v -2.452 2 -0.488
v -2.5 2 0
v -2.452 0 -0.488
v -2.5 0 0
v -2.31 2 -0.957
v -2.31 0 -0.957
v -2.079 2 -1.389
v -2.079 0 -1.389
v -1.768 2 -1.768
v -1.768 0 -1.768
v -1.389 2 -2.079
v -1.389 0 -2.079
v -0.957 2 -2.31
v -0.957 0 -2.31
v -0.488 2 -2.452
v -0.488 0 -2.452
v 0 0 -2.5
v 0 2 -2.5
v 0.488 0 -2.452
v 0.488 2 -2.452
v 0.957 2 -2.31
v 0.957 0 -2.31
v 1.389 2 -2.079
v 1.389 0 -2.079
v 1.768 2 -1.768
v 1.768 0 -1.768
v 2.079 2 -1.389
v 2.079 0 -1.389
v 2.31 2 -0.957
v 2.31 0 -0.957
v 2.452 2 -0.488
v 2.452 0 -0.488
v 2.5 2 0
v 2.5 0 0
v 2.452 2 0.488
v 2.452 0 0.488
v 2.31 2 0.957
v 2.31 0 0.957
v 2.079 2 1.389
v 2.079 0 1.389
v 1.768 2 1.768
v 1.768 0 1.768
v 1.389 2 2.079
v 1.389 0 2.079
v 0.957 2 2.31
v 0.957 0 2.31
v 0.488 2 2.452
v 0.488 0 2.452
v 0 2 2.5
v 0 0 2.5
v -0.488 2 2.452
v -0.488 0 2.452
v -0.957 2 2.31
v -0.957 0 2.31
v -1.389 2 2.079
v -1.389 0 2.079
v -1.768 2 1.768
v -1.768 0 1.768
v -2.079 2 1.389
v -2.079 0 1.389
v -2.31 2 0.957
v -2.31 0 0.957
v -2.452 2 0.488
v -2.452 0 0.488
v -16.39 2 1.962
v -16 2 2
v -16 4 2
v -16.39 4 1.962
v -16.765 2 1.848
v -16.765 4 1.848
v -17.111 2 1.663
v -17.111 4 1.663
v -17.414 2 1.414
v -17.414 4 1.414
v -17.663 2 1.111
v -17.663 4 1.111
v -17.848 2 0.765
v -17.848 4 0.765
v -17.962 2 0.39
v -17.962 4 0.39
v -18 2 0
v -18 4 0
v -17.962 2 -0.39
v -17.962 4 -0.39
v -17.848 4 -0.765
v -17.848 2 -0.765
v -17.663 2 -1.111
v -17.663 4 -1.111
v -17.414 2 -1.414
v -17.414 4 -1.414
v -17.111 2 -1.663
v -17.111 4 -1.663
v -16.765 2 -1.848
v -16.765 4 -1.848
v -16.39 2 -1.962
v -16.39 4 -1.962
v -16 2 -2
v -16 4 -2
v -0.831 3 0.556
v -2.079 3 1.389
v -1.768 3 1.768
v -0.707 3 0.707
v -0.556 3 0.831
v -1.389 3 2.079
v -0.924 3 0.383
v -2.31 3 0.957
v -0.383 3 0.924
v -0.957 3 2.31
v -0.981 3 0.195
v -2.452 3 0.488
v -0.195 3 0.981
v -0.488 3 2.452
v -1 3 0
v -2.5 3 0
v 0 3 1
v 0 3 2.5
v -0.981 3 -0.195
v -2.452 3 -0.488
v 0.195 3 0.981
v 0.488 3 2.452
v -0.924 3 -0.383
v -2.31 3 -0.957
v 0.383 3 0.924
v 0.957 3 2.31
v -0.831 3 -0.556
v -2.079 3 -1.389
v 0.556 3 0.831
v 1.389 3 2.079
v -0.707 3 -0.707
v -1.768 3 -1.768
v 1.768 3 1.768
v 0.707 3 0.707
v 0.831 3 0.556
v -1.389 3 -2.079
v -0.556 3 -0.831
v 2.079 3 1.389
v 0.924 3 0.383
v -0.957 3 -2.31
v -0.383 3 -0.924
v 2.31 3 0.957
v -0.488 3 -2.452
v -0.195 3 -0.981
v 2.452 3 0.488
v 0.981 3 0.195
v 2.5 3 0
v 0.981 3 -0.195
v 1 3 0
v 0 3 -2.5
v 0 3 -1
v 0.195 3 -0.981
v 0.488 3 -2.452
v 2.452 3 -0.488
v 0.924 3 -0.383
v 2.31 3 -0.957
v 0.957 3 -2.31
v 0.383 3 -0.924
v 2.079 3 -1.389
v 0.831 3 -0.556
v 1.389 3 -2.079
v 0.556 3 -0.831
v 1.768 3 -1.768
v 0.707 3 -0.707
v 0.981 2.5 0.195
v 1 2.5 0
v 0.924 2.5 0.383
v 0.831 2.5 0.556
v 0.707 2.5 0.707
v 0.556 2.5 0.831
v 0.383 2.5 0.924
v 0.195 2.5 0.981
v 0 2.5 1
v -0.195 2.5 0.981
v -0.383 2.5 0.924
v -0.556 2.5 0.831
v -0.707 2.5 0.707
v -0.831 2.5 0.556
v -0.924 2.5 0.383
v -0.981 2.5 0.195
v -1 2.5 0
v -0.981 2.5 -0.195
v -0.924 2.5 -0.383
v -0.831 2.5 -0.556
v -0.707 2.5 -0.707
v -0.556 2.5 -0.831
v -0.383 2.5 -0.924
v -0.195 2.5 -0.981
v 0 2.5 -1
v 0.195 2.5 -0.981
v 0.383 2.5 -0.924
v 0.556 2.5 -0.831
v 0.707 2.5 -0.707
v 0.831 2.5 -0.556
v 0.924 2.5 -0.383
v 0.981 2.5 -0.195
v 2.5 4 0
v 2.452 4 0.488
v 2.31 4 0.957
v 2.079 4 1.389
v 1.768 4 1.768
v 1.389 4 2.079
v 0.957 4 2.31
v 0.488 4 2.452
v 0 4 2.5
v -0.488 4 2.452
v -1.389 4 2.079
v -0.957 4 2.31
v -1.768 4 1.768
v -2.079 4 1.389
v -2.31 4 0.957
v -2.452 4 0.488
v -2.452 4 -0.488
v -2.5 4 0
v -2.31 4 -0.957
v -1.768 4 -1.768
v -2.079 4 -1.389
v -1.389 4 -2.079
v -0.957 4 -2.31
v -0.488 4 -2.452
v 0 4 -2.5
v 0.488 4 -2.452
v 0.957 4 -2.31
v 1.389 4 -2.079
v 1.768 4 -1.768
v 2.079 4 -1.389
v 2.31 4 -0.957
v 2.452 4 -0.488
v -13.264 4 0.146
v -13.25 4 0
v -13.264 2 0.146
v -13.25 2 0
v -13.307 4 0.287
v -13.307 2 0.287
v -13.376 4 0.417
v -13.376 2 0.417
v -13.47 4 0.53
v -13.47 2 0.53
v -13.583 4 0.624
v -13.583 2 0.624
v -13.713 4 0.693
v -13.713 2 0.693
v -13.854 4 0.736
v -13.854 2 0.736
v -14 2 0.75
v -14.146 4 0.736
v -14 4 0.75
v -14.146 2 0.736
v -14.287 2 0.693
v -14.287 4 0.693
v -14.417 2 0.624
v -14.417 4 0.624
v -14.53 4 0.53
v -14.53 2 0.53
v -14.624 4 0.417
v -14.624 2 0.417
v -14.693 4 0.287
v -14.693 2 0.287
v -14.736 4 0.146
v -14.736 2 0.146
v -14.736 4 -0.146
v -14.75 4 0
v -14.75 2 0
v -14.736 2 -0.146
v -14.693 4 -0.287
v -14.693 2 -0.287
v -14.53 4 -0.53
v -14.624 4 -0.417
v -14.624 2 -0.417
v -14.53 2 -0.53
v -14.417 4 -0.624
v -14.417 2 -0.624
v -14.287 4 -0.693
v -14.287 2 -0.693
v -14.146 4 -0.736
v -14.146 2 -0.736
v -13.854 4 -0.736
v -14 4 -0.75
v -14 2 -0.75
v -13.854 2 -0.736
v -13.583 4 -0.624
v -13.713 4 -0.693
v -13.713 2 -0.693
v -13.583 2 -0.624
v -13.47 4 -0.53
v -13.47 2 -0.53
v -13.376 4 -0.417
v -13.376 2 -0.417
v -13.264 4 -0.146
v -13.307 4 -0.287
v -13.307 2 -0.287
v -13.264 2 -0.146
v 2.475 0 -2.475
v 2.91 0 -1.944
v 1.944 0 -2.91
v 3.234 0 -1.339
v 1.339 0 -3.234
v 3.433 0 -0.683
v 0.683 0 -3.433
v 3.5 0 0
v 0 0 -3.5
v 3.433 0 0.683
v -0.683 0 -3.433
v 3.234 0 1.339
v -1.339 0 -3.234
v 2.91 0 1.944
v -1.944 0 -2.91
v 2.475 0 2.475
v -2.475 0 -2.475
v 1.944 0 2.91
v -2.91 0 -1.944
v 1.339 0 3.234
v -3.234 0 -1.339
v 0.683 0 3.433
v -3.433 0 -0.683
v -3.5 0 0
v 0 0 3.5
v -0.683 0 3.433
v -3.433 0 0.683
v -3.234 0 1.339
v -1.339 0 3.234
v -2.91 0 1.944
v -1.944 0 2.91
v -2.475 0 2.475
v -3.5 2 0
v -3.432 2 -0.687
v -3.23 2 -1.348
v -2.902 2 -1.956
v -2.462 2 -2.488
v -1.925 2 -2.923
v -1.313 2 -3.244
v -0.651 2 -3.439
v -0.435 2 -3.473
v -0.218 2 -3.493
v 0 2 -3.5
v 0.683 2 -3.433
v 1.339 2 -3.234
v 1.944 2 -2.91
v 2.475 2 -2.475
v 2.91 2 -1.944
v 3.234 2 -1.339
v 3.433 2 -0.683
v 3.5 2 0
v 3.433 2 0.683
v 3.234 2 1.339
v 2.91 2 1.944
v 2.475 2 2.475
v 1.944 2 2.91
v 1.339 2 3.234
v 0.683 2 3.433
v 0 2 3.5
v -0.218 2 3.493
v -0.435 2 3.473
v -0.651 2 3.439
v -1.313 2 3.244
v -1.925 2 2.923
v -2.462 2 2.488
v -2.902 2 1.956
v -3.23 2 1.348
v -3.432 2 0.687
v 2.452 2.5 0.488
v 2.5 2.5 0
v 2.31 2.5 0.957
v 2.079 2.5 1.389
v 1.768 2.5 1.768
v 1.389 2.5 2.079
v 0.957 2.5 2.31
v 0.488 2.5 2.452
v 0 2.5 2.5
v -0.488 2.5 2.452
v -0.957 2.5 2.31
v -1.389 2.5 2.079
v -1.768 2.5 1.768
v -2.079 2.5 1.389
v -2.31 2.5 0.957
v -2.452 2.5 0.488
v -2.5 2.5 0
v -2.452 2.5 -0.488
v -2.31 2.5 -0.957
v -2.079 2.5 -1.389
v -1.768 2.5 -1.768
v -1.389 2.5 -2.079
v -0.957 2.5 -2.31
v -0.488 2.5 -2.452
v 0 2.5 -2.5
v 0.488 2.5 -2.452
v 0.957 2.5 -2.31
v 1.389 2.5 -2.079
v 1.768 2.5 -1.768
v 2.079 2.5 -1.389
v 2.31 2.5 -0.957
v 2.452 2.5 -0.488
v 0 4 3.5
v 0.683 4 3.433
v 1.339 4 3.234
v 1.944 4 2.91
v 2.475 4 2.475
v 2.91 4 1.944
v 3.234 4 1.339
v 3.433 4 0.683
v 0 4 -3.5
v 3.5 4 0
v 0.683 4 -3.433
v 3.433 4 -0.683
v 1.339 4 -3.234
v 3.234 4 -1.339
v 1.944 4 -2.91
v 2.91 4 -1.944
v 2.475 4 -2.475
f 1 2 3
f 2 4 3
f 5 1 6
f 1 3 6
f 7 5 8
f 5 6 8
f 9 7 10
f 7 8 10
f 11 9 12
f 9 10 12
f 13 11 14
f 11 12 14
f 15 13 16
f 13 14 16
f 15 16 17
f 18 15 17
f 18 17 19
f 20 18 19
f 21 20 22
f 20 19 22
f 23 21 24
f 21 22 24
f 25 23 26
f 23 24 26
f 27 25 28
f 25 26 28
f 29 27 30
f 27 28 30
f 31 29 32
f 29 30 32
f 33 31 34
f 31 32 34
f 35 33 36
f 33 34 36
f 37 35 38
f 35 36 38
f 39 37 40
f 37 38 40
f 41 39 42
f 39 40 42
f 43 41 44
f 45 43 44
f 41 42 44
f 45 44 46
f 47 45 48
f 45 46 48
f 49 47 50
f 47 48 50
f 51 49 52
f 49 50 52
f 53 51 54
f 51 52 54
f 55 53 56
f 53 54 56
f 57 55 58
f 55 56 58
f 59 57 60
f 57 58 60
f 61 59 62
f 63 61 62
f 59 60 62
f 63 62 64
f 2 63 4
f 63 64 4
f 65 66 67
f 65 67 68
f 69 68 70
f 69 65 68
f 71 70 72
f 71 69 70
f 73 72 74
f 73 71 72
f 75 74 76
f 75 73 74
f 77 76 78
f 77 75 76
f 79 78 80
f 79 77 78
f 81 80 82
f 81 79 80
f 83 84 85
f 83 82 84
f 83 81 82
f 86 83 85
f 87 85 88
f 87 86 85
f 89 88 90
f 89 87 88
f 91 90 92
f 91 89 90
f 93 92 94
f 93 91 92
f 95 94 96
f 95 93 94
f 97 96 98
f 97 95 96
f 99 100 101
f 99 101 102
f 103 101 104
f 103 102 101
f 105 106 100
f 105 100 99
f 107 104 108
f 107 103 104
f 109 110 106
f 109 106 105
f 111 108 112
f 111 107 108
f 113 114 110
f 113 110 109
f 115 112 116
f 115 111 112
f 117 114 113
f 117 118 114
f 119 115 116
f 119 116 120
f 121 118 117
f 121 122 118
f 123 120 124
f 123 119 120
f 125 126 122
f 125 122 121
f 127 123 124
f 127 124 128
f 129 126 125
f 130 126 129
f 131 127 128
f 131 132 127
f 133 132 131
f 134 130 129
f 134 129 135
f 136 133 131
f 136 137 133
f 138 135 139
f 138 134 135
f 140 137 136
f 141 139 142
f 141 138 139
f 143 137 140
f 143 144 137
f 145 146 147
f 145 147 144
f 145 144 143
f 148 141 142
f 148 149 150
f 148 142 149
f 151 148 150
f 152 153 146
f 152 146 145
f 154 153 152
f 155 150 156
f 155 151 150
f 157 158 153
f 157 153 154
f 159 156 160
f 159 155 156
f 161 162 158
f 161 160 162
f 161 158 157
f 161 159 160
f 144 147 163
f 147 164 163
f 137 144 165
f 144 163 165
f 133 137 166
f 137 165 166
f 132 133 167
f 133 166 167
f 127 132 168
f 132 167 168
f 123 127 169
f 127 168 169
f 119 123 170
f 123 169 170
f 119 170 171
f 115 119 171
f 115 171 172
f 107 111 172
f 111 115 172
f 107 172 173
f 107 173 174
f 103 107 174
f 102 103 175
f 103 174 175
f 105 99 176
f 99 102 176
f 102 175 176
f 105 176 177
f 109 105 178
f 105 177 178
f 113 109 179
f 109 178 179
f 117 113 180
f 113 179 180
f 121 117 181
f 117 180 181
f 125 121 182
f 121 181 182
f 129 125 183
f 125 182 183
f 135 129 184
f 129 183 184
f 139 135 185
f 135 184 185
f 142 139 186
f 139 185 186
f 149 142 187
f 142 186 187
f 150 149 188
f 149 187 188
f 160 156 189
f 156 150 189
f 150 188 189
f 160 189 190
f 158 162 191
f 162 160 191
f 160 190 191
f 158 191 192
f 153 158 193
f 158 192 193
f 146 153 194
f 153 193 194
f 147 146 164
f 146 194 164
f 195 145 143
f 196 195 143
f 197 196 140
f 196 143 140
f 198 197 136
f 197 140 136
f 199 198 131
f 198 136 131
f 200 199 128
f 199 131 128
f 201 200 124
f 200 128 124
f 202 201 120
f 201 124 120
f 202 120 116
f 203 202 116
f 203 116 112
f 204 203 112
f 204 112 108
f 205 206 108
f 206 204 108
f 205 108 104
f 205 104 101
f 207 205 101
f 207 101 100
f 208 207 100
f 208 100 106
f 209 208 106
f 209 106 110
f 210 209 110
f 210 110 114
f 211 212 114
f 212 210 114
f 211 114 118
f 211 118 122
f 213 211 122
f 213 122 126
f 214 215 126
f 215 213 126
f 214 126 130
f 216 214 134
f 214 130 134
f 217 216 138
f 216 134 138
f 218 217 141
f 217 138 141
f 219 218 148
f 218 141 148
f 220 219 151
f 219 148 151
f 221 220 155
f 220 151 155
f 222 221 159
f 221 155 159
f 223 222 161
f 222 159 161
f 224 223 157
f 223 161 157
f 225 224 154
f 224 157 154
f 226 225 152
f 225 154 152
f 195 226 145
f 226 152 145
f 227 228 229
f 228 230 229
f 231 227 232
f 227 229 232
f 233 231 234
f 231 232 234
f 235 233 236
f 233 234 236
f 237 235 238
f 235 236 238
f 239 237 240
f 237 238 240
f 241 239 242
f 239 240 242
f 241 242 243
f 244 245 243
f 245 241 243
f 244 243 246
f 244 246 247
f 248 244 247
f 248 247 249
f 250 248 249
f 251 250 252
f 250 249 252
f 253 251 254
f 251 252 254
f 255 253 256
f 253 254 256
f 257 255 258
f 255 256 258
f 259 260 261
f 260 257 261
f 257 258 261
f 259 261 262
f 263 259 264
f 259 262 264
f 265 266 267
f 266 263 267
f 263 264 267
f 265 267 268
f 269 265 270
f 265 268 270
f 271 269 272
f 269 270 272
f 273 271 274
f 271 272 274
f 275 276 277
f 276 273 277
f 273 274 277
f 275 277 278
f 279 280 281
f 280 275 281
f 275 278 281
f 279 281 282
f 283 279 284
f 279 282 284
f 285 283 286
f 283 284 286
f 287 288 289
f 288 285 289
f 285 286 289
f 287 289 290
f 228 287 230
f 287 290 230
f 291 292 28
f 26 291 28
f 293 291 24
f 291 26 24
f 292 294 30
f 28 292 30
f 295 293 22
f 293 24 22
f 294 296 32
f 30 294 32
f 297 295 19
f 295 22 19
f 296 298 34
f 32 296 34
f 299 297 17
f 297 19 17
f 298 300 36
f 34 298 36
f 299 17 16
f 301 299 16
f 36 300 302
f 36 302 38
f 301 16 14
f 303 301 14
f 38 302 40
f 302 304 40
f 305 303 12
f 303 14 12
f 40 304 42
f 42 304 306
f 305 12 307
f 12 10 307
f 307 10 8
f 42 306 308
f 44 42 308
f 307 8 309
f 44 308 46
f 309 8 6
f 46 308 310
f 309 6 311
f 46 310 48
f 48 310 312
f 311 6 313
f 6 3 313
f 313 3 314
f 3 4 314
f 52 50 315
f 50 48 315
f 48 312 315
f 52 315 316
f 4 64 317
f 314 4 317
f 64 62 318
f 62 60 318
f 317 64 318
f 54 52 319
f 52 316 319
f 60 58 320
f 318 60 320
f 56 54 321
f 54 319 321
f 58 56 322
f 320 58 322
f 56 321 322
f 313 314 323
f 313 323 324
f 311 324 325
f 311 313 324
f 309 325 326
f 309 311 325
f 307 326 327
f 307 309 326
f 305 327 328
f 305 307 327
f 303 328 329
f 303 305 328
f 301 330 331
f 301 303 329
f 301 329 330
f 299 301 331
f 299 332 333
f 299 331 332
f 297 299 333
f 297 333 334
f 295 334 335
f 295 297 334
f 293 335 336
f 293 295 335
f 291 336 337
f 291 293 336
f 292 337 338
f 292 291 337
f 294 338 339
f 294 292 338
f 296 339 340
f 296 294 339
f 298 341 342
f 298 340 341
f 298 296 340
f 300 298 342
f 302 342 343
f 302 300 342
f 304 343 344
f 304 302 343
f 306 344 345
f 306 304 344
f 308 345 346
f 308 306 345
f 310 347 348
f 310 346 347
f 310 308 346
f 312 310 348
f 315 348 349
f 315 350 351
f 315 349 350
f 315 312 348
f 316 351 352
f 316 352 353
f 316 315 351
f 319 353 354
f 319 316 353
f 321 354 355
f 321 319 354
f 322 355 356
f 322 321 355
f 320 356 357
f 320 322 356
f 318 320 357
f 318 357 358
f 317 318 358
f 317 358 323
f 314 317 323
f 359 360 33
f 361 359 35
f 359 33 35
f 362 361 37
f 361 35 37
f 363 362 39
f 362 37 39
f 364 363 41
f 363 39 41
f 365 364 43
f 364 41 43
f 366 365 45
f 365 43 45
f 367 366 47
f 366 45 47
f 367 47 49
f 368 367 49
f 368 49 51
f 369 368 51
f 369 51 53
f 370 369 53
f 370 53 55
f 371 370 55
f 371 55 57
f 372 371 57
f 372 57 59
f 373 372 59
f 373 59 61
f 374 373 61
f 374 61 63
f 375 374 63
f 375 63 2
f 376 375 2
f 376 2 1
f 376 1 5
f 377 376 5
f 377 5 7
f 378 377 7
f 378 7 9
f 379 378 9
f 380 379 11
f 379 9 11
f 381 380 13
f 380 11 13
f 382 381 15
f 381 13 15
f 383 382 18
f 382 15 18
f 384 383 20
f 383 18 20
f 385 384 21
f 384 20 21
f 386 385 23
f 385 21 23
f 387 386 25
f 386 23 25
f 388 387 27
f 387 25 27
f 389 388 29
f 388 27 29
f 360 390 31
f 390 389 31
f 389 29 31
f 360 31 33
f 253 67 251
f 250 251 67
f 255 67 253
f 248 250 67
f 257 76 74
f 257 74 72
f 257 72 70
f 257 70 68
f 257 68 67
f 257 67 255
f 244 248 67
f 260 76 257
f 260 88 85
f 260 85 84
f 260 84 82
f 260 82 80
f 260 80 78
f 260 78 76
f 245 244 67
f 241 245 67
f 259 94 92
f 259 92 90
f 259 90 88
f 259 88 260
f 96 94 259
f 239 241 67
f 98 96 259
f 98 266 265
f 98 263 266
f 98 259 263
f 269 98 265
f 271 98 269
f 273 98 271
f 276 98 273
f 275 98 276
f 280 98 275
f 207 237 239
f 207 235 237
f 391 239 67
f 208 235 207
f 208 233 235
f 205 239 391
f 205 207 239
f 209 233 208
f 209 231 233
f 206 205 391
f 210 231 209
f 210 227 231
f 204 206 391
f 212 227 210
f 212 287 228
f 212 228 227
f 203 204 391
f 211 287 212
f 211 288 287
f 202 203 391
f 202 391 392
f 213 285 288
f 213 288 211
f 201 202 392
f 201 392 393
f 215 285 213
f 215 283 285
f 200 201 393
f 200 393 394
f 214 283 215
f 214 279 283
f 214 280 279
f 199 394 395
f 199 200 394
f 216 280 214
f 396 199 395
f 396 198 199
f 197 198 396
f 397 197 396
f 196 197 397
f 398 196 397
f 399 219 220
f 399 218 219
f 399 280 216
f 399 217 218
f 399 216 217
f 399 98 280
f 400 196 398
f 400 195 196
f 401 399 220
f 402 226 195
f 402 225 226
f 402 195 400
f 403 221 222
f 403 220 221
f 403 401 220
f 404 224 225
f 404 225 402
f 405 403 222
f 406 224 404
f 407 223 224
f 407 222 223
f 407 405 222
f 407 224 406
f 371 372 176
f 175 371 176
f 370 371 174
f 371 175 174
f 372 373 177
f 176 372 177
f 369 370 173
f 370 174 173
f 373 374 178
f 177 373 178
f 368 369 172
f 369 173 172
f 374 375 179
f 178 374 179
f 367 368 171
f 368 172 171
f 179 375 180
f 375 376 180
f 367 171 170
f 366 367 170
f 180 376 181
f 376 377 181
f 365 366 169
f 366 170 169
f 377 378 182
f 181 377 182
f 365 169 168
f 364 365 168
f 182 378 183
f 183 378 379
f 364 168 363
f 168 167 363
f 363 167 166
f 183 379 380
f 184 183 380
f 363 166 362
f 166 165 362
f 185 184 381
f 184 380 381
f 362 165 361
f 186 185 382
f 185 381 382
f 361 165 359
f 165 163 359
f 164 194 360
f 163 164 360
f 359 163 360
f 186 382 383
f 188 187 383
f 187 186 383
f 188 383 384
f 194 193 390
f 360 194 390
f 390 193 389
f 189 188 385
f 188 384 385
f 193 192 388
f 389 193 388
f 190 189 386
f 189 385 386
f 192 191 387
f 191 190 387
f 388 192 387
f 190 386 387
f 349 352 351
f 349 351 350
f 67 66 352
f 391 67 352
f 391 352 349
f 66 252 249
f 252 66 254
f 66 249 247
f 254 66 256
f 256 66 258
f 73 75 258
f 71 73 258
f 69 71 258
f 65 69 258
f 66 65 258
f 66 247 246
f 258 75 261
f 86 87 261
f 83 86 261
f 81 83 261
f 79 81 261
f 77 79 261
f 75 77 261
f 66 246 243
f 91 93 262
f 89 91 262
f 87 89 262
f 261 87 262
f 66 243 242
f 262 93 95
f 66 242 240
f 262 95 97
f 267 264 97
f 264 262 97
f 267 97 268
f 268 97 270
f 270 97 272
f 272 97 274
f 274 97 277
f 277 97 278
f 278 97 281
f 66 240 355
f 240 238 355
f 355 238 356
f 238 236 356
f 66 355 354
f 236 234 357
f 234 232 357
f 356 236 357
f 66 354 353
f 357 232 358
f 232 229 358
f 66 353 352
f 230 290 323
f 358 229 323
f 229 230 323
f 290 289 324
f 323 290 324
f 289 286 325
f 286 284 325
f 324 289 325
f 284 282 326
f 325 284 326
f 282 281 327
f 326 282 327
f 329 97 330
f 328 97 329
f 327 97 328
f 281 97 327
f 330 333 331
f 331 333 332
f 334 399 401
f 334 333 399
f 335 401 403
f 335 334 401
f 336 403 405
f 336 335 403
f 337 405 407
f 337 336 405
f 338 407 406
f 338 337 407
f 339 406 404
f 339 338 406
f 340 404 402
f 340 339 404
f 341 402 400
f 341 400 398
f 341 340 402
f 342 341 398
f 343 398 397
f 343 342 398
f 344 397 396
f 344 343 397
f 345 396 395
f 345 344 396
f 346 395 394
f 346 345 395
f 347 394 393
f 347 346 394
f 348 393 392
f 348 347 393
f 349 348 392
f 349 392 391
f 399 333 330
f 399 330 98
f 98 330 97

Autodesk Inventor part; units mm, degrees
ref_plane "YZ Plane" through (0, 0, 0) normal (1, 0, 0) x (0, 1, 0)
ref_plane "XZ Plane" through (0, 0, 0) normal (0, 1, 0) x (-1, 0, 0)
ref_plane "XY Plane" through (0, 0, 0) normal (0, 0, 1) x (1, 0, 0)
sketch "Sketch1" plane through (0, 0, 0) normal (0, 1, 0) x (-1, 0, 0)
  circle A0 centre (0, 0) radius 2.5
  circle A1 centre (0, 0) radius 3.5
  dimension "d228" = 5
  dimension "d229" = 7
extrude "Extrusion1" add sketch "Sketch1" along normal blind 2
sketch "Sketch2" plane through (0, 2, 0) normal (0, 1, 0) x (1, 0, 0)
  circle A0 centre (0, 0) radius 3.5
  circle A1 centre (0, 0) radius 3.5 projected
  line L0 (-16, -2) -> (0, -3.5)
  circle A2 centre (0, 0) radius 3.5 projected
  line L1 (0, 3.5) -> (-16, 2)
  circle A3 centre (-14, 0) radius 0.75
  arc A4 (-16, 2) -> (-16, -2) centre (-16, 0) ccw
  circle A5 centre (0, 0) radius 1
  circle A6 centre (0, 0) radius 2.5
  circle A7 centre (0, 0) radius 2.5 projected
  dimension "d234" = 1.5
  dimension "d236" = 16
  dimension "d237" = 2
  dimension "d238" = 2
  dimension "d241" = 2
extrude "Extrusion2" add sketch "Sketch2" along normal blind 2 contours A0 L0 L1 | A0 L0 A4 L1
extrude "Extrusion3" add sketch "Sketch2" along normal blind 1 contours A6
extrude "Extrusion4" cut sketch "Sketch2" along normal blind 0.5 contours A6
properties part number "Langbektang houder"
